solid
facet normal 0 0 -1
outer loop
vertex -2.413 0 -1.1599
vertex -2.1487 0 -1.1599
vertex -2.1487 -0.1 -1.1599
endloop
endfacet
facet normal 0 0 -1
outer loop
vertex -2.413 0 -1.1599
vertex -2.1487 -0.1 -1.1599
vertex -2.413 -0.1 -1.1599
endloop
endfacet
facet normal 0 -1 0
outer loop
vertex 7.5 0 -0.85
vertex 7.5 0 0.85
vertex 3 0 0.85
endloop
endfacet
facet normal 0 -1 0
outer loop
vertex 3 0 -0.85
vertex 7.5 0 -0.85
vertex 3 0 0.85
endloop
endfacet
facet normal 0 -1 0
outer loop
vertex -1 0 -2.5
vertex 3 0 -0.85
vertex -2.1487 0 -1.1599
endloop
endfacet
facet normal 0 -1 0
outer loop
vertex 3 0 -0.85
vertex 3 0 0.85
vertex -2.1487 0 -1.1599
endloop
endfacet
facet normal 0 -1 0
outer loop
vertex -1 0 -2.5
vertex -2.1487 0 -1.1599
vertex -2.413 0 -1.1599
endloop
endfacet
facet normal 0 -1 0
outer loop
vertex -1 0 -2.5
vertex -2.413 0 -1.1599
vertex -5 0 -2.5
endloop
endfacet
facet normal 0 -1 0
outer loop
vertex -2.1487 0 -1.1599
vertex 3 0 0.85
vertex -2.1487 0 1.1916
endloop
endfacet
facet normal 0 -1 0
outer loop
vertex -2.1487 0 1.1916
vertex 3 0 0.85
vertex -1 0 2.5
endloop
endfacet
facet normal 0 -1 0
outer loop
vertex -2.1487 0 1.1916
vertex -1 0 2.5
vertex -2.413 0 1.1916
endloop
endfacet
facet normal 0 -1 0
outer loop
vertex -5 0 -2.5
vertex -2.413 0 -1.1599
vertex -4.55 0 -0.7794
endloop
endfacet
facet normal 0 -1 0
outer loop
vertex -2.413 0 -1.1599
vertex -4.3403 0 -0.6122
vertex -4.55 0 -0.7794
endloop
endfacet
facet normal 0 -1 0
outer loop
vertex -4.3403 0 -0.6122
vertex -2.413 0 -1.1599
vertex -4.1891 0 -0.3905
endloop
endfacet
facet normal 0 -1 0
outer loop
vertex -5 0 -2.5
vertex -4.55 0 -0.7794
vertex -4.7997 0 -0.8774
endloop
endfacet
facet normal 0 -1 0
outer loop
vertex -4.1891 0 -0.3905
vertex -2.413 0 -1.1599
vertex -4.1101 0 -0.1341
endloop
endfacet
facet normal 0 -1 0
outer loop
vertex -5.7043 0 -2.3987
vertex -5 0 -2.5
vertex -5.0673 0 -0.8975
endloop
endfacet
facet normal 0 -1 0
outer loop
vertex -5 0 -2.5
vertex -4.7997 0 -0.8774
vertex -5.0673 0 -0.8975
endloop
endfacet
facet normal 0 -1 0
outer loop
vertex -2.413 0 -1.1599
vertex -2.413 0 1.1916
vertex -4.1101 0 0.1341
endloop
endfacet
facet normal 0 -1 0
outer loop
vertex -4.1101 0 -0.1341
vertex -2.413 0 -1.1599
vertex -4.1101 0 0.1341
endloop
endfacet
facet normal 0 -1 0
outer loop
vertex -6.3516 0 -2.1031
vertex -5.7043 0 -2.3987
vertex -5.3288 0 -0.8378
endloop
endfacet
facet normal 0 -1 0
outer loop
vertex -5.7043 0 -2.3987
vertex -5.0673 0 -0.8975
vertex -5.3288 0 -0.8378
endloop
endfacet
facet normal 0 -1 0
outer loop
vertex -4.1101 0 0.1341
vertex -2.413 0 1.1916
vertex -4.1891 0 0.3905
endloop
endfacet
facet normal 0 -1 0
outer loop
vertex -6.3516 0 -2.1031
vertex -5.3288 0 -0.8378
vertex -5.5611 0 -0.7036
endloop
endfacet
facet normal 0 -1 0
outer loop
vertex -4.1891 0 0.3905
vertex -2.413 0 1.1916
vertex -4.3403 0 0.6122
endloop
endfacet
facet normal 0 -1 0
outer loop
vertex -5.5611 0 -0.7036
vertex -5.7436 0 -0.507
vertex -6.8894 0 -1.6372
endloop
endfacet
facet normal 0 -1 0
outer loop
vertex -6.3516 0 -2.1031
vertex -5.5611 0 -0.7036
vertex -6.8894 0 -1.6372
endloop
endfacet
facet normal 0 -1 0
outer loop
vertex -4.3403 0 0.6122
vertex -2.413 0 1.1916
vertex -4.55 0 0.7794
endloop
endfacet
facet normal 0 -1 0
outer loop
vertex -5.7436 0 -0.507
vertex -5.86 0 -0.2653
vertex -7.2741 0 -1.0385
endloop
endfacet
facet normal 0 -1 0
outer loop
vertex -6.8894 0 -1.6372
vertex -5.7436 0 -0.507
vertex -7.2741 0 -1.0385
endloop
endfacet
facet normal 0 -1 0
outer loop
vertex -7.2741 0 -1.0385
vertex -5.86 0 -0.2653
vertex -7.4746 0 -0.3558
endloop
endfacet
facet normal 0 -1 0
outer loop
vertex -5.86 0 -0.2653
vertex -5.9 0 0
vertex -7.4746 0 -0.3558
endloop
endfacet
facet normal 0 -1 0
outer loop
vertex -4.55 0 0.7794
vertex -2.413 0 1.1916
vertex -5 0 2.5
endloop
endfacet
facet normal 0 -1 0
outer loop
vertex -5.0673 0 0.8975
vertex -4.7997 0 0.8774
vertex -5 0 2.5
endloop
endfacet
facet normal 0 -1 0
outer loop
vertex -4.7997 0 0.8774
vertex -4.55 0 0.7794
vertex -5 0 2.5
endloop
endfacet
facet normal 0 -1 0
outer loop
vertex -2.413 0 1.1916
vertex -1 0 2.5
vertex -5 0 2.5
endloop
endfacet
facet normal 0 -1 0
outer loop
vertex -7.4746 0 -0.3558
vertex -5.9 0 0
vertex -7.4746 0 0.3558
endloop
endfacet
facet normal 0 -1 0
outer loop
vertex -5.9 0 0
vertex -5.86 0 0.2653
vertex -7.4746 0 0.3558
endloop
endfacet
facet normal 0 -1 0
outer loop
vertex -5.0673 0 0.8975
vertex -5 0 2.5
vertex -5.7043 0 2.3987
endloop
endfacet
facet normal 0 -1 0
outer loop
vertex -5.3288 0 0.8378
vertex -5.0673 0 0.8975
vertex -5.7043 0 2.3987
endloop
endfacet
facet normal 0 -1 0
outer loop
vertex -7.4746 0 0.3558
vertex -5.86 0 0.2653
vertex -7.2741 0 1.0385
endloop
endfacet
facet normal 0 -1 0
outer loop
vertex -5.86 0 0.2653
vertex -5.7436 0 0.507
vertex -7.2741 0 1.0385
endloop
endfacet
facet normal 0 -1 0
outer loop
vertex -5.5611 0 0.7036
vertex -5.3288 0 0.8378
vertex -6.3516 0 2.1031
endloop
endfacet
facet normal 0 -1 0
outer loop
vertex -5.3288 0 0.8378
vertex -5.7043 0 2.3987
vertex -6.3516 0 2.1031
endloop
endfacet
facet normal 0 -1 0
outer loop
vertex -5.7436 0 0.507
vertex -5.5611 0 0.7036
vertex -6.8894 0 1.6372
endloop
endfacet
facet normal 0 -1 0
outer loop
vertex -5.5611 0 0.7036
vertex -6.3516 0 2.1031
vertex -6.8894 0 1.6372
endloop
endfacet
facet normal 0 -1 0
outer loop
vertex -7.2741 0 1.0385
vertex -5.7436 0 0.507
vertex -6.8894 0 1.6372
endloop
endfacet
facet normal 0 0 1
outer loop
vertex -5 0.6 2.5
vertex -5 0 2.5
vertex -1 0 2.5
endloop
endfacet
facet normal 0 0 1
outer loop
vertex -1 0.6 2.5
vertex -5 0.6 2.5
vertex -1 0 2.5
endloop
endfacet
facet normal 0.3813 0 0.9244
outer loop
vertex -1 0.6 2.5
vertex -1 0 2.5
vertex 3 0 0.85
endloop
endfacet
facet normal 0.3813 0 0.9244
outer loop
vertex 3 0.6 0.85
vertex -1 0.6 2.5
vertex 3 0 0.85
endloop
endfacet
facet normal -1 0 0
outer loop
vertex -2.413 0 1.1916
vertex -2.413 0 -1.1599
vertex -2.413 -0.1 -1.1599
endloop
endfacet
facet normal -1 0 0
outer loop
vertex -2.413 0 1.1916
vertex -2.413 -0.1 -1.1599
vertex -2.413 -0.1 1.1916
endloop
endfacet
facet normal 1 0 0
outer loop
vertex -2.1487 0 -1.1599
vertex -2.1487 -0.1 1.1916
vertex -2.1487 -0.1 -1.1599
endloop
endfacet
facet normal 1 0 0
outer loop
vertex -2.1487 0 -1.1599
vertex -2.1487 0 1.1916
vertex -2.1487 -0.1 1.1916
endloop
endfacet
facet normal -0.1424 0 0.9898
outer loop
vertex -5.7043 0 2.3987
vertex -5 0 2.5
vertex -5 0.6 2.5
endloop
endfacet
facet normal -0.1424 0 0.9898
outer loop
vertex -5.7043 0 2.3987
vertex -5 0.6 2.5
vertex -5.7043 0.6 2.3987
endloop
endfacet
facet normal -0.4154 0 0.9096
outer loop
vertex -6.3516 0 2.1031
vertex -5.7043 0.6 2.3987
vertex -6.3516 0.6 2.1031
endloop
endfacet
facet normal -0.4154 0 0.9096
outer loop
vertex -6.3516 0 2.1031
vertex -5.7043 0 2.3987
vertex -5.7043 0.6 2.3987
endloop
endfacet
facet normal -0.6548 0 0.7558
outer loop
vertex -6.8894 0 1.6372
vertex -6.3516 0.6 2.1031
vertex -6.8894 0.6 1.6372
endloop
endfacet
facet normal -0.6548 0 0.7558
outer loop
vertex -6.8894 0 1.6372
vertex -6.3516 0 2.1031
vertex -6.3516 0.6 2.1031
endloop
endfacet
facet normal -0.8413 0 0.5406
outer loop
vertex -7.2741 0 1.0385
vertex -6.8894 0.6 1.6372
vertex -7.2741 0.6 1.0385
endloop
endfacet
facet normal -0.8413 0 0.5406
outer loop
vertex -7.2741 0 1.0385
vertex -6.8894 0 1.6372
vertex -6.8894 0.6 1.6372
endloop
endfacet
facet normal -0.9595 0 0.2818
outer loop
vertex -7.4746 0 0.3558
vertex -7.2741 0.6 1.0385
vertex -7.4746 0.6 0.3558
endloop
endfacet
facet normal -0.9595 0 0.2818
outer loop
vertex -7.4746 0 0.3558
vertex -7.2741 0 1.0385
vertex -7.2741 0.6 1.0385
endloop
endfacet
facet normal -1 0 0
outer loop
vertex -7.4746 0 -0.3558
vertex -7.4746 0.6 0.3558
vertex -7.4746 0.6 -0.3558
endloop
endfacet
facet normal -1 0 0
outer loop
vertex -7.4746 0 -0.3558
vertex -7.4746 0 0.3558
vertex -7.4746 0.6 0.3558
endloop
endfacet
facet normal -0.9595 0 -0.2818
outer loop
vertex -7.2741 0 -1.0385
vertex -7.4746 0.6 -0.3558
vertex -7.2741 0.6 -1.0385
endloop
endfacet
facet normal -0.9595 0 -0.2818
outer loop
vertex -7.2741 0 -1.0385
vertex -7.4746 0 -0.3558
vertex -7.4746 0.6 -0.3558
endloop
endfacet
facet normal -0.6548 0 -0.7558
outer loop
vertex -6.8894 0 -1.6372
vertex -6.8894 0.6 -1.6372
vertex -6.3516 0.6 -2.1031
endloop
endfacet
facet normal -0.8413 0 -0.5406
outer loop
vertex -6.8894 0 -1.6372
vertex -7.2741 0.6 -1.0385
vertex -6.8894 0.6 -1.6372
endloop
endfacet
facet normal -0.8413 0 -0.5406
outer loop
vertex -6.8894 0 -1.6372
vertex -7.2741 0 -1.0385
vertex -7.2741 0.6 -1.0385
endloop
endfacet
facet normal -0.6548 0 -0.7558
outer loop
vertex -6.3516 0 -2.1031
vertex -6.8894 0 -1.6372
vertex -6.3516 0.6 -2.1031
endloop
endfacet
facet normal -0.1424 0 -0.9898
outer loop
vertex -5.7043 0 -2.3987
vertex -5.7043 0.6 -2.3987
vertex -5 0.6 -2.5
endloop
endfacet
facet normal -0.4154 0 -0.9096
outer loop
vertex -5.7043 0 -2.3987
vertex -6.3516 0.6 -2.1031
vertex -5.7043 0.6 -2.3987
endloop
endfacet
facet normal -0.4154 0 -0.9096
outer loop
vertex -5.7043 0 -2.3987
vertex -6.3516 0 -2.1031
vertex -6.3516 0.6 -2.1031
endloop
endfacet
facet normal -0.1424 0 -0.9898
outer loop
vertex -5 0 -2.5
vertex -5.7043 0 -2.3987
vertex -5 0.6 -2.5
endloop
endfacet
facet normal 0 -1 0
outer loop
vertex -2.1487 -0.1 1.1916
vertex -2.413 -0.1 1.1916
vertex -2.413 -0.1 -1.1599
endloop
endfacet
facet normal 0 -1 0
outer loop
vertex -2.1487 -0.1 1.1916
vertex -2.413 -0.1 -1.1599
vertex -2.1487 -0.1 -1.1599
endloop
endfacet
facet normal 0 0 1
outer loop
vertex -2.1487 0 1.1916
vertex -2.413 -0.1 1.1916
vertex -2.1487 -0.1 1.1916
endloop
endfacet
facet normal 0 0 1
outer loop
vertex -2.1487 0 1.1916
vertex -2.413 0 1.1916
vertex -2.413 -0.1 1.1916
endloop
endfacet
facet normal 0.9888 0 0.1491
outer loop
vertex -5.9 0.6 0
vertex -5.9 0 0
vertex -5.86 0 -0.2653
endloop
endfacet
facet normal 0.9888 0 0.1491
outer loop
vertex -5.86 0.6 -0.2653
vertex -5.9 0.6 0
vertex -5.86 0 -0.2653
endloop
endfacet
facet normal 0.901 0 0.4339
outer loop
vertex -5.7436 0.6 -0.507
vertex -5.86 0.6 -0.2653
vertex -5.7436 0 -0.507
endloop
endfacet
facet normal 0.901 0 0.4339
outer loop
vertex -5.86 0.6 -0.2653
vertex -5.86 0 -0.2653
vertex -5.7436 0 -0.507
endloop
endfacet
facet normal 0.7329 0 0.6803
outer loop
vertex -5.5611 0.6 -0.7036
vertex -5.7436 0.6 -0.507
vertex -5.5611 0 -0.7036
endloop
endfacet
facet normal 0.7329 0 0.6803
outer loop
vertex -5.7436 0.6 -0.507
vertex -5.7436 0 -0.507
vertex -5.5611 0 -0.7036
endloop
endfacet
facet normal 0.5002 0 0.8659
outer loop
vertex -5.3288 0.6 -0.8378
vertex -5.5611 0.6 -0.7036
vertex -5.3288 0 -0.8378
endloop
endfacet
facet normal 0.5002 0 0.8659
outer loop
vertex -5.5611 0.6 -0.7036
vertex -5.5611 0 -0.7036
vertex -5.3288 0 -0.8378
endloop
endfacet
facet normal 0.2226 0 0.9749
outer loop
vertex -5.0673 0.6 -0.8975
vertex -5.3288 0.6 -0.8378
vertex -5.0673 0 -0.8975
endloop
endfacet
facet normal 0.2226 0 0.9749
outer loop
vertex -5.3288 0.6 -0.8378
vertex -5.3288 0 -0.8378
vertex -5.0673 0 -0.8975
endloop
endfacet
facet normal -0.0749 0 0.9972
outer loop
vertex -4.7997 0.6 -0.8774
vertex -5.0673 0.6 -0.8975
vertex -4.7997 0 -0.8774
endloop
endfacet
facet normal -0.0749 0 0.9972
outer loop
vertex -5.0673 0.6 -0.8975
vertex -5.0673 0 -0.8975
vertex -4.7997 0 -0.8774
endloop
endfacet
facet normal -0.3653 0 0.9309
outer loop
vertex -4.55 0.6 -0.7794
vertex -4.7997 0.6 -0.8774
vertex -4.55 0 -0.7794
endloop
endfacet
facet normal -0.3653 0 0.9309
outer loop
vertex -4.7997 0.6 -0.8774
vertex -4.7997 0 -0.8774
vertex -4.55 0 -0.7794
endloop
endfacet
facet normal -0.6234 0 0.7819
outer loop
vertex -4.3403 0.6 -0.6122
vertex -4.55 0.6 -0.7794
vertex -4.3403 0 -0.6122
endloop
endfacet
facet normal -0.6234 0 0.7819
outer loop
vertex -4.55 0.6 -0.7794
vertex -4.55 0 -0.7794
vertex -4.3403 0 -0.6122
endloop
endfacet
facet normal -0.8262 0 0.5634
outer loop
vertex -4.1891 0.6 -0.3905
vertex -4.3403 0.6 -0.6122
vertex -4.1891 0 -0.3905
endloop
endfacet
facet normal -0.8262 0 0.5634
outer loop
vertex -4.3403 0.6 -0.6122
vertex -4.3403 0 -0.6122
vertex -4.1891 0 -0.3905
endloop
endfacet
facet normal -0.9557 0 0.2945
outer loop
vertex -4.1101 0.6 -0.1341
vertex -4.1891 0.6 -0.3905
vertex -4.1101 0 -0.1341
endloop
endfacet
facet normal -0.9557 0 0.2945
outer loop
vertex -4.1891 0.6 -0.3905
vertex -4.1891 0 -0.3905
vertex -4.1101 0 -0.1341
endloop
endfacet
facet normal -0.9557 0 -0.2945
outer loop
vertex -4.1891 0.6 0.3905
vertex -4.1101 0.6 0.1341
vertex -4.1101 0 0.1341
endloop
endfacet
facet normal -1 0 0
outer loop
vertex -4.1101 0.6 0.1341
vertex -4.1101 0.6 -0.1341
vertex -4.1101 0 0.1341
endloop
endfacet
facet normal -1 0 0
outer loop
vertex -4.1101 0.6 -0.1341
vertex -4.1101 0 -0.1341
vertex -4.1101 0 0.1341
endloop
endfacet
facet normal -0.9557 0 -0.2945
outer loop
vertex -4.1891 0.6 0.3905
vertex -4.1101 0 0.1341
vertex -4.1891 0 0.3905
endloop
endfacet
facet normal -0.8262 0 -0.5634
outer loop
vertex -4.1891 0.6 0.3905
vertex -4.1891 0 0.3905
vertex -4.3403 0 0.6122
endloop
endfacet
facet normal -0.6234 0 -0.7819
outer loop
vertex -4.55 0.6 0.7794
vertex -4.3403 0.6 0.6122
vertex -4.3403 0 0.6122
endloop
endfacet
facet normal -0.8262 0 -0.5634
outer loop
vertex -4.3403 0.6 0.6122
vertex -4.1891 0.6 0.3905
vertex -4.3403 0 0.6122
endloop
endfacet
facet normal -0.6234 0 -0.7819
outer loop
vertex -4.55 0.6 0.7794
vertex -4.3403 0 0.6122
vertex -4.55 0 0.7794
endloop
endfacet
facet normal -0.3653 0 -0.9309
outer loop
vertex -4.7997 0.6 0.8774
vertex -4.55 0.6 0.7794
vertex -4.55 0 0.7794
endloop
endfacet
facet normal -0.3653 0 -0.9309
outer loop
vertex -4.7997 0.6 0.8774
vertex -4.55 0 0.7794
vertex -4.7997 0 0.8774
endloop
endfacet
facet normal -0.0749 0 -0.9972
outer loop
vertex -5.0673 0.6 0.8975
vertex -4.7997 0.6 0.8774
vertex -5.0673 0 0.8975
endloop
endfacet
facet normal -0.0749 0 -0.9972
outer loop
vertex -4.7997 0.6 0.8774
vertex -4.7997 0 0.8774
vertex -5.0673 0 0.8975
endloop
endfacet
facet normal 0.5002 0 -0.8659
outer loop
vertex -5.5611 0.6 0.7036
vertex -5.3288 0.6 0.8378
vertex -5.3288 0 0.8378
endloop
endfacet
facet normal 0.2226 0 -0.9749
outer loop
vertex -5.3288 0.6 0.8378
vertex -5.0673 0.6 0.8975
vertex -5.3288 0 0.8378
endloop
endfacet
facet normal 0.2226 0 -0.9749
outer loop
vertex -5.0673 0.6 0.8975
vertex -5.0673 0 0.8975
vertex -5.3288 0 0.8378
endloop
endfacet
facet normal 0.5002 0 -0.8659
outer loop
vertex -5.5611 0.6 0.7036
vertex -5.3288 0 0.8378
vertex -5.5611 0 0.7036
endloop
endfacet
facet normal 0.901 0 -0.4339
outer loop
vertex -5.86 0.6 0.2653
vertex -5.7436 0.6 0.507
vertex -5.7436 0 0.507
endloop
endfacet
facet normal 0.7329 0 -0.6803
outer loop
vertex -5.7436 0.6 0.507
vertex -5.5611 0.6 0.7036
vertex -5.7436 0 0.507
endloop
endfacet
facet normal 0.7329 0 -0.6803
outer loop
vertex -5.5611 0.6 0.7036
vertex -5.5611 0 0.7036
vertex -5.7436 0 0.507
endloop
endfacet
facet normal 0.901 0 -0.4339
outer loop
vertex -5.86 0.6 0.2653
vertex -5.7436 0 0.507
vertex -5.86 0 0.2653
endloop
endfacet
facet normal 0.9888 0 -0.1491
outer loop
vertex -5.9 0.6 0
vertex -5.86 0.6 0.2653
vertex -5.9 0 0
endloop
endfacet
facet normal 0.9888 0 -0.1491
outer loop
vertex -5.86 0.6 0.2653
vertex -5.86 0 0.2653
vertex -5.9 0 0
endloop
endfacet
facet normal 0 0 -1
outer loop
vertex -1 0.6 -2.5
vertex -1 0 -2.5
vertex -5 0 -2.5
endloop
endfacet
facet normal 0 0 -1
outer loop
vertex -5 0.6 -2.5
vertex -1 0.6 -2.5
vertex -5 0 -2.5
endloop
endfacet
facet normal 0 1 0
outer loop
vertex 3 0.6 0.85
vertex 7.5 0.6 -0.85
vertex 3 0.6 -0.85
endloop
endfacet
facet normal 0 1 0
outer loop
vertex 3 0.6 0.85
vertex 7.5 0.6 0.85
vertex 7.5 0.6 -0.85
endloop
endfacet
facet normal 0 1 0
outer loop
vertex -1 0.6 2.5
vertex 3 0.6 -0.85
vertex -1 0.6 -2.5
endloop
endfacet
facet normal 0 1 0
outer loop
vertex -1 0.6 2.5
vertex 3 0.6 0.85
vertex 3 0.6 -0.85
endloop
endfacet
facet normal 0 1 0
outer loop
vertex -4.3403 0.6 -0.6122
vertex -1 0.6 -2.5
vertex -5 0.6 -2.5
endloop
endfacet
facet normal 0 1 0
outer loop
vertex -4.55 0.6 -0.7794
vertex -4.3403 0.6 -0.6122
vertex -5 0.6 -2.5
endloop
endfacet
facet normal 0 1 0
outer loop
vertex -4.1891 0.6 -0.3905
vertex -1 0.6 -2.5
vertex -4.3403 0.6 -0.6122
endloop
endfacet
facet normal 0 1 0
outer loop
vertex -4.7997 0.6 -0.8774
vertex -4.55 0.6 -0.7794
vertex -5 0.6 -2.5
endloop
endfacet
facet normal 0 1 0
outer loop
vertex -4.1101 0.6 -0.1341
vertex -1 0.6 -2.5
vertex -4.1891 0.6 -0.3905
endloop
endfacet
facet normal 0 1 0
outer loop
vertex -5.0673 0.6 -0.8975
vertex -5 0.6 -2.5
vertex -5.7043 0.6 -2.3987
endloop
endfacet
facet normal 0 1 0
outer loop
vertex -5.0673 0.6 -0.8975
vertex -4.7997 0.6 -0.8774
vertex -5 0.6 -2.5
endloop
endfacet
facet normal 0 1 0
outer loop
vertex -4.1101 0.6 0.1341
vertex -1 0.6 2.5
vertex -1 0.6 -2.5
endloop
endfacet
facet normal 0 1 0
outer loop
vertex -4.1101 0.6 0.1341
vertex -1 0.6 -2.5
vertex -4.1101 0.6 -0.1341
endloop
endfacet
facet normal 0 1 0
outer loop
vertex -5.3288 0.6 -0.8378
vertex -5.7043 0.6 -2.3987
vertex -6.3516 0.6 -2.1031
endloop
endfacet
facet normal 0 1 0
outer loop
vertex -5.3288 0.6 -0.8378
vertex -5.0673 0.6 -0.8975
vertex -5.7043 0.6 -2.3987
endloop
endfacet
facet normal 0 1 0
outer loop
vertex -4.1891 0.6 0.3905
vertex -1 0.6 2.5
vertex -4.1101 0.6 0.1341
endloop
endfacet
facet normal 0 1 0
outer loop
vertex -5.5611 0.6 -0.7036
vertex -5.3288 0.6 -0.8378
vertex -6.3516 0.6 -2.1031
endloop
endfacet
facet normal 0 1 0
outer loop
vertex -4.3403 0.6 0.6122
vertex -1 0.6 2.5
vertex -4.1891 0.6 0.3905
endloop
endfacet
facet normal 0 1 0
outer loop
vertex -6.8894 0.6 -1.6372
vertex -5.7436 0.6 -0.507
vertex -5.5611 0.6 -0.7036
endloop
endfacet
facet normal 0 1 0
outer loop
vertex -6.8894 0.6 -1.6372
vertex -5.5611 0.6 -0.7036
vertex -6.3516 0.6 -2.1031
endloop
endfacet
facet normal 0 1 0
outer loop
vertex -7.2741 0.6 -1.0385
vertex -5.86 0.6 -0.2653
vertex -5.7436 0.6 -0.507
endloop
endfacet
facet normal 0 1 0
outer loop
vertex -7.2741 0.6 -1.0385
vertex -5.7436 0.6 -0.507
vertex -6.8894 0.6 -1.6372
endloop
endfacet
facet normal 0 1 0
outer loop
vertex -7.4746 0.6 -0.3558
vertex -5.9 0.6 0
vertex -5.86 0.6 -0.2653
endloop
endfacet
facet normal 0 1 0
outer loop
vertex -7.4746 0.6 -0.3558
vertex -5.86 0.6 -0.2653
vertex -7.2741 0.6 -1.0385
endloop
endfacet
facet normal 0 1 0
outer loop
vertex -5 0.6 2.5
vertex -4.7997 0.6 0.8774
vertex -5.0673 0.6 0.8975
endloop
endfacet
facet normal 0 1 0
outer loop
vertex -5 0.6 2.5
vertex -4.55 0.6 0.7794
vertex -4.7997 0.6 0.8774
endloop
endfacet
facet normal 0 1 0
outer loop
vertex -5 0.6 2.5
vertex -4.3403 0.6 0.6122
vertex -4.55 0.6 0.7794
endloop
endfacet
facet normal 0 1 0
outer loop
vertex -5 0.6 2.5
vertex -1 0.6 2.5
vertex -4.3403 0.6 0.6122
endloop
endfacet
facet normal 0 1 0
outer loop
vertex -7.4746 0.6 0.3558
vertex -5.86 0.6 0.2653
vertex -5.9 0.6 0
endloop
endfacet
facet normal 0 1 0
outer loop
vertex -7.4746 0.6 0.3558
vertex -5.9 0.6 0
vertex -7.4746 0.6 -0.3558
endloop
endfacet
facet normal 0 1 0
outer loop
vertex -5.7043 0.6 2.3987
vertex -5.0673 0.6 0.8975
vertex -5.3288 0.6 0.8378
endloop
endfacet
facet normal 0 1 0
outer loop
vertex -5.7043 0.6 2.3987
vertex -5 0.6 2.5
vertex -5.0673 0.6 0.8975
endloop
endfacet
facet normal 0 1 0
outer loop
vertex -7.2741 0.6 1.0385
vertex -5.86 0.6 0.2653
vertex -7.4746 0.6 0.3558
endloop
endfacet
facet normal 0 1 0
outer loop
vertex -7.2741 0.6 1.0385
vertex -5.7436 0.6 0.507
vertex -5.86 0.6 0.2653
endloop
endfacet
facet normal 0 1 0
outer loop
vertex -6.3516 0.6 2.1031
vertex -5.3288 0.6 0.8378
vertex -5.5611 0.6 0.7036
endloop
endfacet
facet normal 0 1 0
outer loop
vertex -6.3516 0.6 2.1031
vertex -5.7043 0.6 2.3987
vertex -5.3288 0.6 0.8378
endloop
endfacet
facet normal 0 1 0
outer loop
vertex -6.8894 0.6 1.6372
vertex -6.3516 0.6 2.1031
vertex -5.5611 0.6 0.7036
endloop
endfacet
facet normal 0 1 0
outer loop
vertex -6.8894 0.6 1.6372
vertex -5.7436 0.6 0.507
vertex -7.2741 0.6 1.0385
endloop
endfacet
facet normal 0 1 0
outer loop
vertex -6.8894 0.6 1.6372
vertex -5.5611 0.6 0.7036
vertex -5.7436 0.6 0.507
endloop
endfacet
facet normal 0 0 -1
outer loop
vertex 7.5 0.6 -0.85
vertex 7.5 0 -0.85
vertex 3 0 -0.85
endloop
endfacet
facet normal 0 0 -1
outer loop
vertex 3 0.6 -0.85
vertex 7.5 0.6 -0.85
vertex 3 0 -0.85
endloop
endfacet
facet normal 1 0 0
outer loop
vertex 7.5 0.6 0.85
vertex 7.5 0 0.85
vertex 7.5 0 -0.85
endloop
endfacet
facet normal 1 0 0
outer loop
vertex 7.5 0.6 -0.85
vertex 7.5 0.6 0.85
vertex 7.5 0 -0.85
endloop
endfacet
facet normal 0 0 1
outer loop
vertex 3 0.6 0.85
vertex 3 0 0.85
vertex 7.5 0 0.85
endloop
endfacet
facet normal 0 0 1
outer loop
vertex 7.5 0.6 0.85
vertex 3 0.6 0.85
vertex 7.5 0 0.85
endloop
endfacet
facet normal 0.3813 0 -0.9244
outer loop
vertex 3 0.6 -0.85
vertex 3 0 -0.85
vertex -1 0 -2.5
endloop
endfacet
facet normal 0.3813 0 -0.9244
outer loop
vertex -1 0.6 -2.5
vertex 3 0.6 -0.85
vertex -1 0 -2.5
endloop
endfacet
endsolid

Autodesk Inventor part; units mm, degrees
ref_plane "YZ Plane" through (0, 0, 0) normal (1, 0, 0) x (0, 1, 0)
ref_plane "XZ Plane" through (0, 0, 0) normal (0, 1, 0) x (-1, 0, 0)
ref_plane "XY Plane" through (0, 0, 0) normal (0, 0, 1) x (1, 0, 0)
sketch "Sketch2" plane through (0, 0, 0) normal (0, 1, 0) x (-1, 0, 0)
  line L0 (-7.5, 0.85) -> (-7.5, -0.85)
  line L1 (1, -2.5) -> (5, -2.5)
  line L2 (7.5, 2.5) -> (-7.5, -2.5) construction
  line L3 (-7.5, 2.5) -> (7.5, -2.5) construction
  arc A0 (5, -2.5) -> (5, 2.5) centre (5, 0) ccw
  circle A1 centre (5, 0) radius 0.9
  line L4 (-3, 0.85) -> (-7.5, 0.85)
  line L5 (-7.5, 0.85) -> (-7.5, -0.85)
  line L6 (-7.5, -0.85) -> (-3, -0.85)
  line L7 (1, 2.5) -> (-3, 0.85)
  line L8 (-3, -0.85) -> (1, -2.5)
  line L9 (5, 2.5) -> (1, 2.5)
  point P0 (0, 0)
  dimension "d3" = 1.8
extrude "Extrusion1" add sketch "Sketch2" along normal blind 0.6
sketch "Sketch3" plane through (0, 0, 0) normal (0, -1, 0) x (1, 0, 0)
  line L0 (-2.413, -1.1278) -> (-2.413, 1.9227) construction
  line L1 (-2.413, 1.9227) -> (-0.0196, 1.9227) construction
  line L2 (-0.0196, 1.9227) -> (-0.0196, -1.1278) construction
  line L3 (-0.0196, -1.1278) -> (-2.413, -1.1278) construction
  line L4 (-2.1487, 1.1916) -> (-2.1487, -1.1599)
  line L5 (-2.1487, -1.1599) -> (-2.413, -1.1599)
  line L6 (-2.413, -1.1599) -> (-2.413, 1.1916)
  line L7 (-2.413, 1.1916) -> (-2.1487, 1.1916)
  point P0 (0, 0)
extrude "Extrusion2" add sketch "Sketch3" along normal blind 0.1
properties part number "Negative Pin" material "Copper, Alloy"
